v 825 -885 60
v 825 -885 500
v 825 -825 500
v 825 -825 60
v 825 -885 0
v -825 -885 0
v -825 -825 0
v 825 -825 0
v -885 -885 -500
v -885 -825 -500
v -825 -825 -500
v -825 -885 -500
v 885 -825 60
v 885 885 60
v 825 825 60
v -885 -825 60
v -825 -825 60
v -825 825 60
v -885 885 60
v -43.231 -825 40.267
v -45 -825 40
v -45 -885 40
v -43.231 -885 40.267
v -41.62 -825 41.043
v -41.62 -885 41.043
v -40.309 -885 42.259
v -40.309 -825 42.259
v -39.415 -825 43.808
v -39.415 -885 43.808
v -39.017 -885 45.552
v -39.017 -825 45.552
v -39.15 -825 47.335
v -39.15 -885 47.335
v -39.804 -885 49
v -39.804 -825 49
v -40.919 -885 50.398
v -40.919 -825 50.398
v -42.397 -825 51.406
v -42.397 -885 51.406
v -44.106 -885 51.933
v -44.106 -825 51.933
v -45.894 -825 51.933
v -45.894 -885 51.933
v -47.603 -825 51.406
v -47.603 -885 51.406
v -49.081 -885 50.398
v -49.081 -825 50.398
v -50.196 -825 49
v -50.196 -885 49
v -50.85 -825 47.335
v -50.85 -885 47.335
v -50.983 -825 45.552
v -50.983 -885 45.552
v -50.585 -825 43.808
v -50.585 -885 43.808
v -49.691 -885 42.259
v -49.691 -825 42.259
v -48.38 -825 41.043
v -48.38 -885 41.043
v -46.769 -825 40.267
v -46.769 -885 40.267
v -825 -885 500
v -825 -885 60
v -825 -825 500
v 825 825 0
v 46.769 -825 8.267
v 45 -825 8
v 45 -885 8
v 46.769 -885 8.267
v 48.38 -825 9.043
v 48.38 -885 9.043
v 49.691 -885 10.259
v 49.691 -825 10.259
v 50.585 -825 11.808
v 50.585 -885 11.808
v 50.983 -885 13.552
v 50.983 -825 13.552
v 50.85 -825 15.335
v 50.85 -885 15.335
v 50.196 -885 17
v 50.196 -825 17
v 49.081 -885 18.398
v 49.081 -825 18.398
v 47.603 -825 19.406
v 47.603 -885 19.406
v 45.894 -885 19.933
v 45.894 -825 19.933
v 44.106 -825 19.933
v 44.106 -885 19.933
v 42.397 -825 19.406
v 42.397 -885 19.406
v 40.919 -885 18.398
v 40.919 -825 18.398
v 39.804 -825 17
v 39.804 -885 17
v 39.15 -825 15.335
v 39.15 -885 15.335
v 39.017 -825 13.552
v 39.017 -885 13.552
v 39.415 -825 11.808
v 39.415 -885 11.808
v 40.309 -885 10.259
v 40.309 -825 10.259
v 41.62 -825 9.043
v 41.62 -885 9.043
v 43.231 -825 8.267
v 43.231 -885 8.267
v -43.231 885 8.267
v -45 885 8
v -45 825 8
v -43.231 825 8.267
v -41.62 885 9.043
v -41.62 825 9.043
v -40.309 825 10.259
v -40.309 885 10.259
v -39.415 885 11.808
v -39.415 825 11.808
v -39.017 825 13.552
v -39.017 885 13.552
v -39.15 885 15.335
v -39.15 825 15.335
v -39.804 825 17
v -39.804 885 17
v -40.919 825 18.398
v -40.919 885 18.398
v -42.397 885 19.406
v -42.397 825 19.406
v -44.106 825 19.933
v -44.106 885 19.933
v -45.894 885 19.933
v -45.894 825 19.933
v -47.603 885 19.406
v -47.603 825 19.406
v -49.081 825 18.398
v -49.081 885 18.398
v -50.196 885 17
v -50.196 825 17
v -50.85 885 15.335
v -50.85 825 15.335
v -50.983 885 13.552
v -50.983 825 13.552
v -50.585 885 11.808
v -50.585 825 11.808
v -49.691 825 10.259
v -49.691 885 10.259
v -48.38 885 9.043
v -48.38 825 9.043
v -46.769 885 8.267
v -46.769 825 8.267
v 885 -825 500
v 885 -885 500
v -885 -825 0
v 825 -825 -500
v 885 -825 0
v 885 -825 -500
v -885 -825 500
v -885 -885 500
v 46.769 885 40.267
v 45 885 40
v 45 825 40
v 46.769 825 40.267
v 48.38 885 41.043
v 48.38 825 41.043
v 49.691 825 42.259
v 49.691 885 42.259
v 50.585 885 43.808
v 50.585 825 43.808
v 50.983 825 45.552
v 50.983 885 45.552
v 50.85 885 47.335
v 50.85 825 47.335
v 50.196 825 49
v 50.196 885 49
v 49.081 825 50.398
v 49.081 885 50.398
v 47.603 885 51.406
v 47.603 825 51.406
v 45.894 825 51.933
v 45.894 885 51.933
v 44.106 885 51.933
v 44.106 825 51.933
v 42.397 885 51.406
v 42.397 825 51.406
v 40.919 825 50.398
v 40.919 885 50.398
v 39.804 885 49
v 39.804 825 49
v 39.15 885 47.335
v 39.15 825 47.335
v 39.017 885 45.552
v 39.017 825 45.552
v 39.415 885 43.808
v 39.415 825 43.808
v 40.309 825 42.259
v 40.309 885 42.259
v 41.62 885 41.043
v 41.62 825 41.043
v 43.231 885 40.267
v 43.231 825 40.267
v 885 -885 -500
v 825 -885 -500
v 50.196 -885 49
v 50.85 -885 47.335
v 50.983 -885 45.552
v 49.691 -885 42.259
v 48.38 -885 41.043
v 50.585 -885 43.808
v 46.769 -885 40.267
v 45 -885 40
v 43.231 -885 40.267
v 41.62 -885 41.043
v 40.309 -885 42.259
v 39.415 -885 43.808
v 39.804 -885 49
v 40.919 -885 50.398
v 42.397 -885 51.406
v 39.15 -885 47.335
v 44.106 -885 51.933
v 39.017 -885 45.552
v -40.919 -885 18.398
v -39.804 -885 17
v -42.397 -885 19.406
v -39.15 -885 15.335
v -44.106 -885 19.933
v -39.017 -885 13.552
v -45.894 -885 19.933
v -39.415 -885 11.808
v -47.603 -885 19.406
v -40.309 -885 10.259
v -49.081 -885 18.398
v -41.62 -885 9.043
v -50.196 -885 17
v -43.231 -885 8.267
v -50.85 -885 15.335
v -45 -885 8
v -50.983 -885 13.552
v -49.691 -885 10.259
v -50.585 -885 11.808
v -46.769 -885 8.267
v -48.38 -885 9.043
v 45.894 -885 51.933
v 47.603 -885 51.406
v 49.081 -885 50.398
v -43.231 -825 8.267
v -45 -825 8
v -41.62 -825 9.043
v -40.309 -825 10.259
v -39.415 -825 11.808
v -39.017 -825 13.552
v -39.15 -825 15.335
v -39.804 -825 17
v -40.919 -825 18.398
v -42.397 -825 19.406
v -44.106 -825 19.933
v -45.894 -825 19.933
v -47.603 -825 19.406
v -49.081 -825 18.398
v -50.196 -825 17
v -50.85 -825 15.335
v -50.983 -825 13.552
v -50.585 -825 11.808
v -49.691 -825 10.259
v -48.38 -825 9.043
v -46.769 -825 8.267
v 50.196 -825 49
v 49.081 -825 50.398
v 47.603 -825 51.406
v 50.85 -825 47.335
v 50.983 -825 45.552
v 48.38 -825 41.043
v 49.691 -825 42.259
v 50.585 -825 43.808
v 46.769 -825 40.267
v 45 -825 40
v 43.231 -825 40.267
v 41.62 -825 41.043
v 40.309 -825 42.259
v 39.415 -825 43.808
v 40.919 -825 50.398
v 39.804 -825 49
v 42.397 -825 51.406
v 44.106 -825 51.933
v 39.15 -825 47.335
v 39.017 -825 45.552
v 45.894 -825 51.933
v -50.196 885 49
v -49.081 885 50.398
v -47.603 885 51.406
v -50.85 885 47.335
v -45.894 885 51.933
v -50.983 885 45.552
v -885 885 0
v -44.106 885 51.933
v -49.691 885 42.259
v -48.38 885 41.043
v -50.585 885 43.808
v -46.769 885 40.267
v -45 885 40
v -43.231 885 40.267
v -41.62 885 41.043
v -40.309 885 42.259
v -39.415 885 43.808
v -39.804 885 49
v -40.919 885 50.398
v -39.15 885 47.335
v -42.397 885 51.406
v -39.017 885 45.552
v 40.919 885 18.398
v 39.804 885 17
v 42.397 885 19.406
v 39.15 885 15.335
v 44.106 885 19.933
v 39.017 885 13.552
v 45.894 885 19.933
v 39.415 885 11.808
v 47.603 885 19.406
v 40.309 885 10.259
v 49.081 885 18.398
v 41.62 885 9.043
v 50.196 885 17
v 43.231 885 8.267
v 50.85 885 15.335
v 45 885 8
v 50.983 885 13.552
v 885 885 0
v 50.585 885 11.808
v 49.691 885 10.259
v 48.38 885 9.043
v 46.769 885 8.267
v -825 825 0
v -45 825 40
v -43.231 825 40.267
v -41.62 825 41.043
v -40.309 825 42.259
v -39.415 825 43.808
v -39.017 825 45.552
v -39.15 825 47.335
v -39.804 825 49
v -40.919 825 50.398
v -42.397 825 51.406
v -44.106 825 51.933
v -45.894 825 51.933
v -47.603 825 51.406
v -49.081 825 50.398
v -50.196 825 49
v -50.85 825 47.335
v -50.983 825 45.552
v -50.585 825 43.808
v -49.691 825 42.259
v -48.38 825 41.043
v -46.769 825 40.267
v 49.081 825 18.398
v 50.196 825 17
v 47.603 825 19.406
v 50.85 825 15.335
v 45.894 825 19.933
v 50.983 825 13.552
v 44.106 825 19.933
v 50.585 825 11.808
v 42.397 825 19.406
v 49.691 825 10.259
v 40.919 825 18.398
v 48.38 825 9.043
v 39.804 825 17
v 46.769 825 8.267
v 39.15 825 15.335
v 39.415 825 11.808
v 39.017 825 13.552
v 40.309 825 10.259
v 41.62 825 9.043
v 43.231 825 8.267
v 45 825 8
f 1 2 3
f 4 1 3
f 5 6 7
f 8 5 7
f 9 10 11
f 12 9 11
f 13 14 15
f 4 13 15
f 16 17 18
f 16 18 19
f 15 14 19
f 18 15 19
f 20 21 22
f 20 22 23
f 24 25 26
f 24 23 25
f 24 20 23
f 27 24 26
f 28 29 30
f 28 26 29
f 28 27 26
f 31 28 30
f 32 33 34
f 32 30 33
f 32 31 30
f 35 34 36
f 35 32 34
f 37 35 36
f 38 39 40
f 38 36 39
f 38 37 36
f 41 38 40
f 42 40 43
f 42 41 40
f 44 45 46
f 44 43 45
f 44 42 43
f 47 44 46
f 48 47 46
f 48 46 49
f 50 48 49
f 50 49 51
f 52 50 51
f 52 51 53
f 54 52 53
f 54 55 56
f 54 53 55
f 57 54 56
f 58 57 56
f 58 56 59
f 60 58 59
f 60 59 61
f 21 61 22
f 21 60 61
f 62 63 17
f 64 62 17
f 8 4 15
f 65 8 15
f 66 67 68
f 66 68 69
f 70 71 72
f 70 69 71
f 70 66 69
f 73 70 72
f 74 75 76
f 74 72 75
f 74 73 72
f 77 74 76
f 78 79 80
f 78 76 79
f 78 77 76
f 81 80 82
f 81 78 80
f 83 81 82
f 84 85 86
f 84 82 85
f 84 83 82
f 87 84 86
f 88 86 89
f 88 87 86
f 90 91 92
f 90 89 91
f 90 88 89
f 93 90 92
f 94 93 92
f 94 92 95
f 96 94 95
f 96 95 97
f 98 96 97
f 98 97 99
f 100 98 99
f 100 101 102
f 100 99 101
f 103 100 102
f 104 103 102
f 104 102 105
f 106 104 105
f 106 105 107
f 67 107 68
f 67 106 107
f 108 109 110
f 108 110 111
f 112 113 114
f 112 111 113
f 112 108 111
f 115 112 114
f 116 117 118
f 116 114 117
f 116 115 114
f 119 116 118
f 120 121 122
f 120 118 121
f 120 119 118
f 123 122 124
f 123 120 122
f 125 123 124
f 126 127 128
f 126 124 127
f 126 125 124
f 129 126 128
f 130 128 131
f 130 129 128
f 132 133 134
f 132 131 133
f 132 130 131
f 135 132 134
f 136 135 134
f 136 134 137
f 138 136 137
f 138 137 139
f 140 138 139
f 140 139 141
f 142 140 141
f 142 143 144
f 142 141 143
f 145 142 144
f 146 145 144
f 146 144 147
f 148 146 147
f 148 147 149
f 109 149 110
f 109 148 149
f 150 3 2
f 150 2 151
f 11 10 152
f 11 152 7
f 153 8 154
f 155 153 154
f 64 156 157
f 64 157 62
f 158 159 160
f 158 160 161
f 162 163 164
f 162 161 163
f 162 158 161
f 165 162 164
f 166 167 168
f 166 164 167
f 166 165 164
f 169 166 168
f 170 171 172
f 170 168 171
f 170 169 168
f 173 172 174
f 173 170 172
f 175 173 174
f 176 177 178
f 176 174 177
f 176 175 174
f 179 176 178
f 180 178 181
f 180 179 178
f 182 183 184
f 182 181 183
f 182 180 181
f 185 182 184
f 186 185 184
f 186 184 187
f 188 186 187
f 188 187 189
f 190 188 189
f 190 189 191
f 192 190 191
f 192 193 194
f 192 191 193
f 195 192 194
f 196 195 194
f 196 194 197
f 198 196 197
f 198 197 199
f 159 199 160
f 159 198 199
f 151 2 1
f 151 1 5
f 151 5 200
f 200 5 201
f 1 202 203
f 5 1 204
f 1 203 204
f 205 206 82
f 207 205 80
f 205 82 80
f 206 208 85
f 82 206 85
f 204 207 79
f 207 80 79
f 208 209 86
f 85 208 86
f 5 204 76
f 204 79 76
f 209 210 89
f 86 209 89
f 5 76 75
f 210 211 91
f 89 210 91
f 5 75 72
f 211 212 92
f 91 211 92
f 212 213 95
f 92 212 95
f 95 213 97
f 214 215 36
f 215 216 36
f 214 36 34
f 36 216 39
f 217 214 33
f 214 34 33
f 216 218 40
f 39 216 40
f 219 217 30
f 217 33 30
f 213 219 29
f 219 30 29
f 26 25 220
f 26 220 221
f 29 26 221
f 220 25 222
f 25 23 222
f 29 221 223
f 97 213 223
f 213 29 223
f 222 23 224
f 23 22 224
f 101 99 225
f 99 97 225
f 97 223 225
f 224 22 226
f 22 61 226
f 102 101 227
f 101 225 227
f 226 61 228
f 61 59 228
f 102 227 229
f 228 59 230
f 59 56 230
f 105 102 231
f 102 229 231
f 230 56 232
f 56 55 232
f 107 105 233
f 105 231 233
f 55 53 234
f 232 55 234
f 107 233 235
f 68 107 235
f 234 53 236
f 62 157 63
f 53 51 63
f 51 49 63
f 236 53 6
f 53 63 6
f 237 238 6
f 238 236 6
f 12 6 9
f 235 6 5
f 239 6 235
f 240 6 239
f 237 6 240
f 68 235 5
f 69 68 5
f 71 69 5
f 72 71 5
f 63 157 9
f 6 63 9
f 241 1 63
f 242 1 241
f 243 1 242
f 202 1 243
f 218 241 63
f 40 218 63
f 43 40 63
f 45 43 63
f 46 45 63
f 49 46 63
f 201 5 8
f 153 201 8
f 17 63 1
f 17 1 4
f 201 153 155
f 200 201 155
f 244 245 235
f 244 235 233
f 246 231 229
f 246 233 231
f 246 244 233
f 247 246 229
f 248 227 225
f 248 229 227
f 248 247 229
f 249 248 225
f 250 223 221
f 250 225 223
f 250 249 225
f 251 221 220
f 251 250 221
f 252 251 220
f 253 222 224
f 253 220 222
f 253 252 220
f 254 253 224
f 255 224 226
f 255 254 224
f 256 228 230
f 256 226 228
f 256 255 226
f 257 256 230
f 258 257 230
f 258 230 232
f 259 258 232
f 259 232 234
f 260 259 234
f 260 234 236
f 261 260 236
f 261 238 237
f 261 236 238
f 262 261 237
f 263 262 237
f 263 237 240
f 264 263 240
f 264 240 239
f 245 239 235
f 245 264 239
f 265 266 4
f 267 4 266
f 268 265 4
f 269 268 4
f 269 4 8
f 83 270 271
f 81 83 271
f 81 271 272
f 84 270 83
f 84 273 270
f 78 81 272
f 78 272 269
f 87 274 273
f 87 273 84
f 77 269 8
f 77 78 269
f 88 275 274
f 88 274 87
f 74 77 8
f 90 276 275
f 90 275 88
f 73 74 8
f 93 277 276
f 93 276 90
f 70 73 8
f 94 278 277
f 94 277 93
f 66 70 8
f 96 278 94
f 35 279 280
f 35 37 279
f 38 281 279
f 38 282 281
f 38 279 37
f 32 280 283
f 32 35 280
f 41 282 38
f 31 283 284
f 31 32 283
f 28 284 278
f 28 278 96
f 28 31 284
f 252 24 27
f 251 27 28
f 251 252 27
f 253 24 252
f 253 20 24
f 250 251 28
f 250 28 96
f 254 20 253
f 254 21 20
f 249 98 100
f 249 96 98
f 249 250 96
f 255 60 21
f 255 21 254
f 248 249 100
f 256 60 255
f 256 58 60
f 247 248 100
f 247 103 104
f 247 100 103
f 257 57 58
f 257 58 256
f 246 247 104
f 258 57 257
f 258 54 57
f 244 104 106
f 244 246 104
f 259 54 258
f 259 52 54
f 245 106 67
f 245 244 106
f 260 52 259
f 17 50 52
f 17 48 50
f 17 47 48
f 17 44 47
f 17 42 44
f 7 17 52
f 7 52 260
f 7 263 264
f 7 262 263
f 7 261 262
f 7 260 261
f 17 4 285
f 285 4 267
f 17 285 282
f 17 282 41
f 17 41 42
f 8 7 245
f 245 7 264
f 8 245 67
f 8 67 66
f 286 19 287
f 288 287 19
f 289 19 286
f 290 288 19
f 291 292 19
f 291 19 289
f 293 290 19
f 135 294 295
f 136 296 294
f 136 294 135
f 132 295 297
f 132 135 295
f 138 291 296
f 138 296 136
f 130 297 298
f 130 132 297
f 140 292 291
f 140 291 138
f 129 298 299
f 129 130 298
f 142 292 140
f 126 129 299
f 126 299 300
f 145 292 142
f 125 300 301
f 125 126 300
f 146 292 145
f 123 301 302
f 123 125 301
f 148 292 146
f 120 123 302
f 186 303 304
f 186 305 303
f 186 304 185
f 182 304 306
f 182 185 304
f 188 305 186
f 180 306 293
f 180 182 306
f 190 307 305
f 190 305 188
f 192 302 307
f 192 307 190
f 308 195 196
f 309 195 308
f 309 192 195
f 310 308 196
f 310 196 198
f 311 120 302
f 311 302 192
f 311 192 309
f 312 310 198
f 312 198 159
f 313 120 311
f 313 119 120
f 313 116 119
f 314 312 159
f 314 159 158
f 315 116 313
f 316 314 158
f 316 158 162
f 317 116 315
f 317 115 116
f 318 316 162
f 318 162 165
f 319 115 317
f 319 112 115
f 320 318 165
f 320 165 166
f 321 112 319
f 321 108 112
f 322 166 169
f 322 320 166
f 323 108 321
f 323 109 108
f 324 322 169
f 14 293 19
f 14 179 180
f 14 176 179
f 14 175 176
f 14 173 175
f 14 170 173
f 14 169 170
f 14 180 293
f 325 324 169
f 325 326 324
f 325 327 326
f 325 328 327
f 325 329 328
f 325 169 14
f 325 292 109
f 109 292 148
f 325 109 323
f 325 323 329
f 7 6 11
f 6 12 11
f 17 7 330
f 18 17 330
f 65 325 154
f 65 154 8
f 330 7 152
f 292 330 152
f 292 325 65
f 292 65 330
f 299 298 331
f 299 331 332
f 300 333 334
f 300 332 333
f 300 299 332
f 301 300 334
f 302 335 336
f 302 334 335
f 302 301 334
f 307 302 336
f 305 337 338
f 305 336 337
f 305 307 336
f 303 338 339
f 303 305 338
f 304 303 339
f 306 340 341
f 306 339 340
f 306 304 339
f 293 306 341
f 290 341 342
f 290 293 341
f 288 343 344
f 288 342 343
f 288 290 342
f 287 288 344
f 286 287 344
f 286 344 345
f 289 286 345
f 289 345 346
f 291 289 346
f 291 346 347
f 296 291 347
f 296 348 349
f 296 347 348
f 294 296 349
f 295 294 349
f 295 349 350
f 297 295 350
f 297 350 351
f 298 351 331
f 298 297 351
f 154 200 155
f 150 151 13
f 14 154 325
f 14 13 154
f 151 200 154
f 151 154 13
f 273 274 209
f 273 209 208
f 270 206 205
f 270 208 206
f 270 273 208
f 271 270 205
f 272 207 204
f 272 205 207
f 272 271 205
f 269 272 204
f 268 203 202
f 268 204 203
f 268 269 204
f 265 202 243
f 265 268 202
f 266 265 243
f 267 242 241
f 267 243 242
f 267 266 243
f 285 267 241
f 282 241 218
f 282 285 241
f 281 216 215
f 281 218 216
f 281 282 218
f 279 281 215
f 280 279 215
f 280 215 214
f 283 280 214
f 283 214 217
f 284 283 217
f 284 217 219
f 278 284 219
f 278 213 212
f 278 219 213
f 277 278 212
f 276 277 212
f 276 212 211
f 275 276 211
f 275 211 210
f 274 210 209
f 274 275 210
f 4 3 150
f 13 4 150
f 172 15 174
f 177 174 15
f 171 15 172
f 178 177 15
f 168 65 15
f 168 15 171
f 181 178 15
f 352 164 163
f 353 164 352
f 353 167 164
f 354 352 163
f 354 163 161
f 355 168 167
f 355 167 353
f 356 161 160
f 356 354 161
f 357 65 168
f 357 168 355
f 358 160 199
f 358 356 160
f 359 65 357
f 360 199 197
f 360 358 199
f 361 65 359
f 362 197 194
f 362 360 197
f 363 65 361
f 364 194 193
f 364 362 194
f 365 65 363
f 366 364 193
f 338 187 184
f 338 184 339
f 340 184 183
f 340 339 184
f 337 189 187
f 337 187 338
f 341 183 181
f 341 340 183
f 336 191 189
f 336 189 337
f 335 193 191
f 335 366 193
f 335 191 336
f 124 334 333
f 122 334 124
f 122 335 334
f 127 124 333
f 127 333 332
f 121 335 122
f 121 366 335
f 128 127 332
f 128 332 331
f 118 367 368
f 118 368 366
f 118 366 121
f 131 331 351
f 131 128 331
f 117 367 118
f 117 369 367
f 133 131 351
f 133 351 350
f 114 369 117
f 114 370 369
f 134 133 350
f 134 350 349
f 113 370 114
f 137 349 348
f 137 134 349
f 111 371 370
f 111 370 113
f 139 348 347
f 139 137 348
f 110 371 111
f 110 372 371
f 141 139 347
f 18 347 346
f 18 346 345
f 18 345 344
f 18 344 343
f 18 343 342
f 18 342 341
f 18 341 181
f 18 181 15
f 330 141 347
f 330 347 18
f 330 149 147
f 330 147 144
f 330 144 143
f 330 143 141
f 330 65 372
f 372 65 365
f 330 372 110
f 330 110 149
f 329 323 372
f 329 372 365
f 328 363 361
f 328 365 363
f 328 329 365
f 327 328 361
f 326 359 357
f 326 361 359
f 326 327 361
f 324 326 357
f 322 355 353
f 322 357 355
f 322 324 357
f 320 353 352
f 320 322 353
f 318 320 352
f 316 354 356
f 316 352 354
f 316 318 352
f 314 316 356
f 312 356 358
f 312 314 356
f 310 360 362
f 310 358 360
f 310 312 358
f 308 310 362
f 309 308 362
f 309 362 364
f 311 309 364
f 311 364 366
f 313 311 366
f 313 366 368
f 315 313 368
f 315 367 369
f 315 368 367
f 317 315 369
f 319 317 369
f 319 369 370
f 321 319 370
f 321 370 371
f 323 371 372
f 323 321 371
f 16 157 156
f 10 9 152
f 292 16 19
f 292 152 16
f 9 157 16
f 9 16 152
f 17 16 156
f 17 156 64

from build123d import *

# Parameters (mm, degrees)
BOSS_EXTRUDE2_DEPTH     = 60
SKETCH2_W               = 60
SKETCH2_H               = 60
BOSS_EXTRUDE3_DEPTH     = 500
SKETCH4_W               = 60
SKETCH4_H               = 60
BOSS_EXTRUDE4_DEPTH     = 1703
CUT_EXTRUDE2_DEPTH      = 1990.302641631
CUT_EXTRUDE2_DEPTH_BACK = 298
SKETCH5_R               = 6


with BuildPart() as part:
    # Sketch1 → Boss-Extrude2 (new body)
    with BuildSketch(Plane.XY):
        Polygon((885, 885), (885, -885), (825, -885), (825, -825), (825, 825), (-825, 825), (-825, -825), (-825, -885), (-885, -885), (-885, 885), align=None)
    extrude(amount=BOSS_EXTRUDE2_DEPTH)

    # Sketch2 → Boss-Extrude3 (add, symmetric)
    with BuildSketch(Plane.XY):
        with Locations((-855, -855)):
            Rectangle(SKETCH2_W, SKETCH2_H)
        with Locations((855, -855)):
            Rectangle(SKETCH2_W, SKETCH2_H)
    extrude(amount=BOSS_EXTRUDE3_DEPTH, both=True)

    # Sketch4 → Boss-Extrude4 (add)
    with BuildSketch(Plane(origin=(-825, 0, 0), x_dir=(0, 0, -1), z_dir=(1, 0, 0))):
        with Locations((-30, -855)):
            Rectangle(SKETCH4_W, SKETCH4_H)
    extrude(amount=BOSS_EXTRUDE4_DEPTH)

    # Sketch5 → Cut-Extrude2 (cut, two sides: drawn at the far end of the back side and taken through both)
    with BuildSketch(Plane.XZ.offset(-825).offset(-CUT_EXTRUDE2_DEPTH_BACK)):
        with Locations(Location((-45, 46, 0), (0, 0, 270))):
            Circle(SKETCH5_R)
        with Locations(Location((-45, 14, 0), (0, 0, 270))):
            Circle(SKETCH5_R)
        with Locations(Location((45, 46, 0), (0, 0, 270))):
            Circle(SKETCH5_R)
        with Locations(Location((45, 14, 0), (0, 0, 270))):
            Circle(SKETCH5_R)
    extrude(amount=CUT_EXTRUDE2_DEPTH + CUT_EXTRUDE2_DEPTH_BACK, mode=Mode.SUBTRACT)


solid = part.part
